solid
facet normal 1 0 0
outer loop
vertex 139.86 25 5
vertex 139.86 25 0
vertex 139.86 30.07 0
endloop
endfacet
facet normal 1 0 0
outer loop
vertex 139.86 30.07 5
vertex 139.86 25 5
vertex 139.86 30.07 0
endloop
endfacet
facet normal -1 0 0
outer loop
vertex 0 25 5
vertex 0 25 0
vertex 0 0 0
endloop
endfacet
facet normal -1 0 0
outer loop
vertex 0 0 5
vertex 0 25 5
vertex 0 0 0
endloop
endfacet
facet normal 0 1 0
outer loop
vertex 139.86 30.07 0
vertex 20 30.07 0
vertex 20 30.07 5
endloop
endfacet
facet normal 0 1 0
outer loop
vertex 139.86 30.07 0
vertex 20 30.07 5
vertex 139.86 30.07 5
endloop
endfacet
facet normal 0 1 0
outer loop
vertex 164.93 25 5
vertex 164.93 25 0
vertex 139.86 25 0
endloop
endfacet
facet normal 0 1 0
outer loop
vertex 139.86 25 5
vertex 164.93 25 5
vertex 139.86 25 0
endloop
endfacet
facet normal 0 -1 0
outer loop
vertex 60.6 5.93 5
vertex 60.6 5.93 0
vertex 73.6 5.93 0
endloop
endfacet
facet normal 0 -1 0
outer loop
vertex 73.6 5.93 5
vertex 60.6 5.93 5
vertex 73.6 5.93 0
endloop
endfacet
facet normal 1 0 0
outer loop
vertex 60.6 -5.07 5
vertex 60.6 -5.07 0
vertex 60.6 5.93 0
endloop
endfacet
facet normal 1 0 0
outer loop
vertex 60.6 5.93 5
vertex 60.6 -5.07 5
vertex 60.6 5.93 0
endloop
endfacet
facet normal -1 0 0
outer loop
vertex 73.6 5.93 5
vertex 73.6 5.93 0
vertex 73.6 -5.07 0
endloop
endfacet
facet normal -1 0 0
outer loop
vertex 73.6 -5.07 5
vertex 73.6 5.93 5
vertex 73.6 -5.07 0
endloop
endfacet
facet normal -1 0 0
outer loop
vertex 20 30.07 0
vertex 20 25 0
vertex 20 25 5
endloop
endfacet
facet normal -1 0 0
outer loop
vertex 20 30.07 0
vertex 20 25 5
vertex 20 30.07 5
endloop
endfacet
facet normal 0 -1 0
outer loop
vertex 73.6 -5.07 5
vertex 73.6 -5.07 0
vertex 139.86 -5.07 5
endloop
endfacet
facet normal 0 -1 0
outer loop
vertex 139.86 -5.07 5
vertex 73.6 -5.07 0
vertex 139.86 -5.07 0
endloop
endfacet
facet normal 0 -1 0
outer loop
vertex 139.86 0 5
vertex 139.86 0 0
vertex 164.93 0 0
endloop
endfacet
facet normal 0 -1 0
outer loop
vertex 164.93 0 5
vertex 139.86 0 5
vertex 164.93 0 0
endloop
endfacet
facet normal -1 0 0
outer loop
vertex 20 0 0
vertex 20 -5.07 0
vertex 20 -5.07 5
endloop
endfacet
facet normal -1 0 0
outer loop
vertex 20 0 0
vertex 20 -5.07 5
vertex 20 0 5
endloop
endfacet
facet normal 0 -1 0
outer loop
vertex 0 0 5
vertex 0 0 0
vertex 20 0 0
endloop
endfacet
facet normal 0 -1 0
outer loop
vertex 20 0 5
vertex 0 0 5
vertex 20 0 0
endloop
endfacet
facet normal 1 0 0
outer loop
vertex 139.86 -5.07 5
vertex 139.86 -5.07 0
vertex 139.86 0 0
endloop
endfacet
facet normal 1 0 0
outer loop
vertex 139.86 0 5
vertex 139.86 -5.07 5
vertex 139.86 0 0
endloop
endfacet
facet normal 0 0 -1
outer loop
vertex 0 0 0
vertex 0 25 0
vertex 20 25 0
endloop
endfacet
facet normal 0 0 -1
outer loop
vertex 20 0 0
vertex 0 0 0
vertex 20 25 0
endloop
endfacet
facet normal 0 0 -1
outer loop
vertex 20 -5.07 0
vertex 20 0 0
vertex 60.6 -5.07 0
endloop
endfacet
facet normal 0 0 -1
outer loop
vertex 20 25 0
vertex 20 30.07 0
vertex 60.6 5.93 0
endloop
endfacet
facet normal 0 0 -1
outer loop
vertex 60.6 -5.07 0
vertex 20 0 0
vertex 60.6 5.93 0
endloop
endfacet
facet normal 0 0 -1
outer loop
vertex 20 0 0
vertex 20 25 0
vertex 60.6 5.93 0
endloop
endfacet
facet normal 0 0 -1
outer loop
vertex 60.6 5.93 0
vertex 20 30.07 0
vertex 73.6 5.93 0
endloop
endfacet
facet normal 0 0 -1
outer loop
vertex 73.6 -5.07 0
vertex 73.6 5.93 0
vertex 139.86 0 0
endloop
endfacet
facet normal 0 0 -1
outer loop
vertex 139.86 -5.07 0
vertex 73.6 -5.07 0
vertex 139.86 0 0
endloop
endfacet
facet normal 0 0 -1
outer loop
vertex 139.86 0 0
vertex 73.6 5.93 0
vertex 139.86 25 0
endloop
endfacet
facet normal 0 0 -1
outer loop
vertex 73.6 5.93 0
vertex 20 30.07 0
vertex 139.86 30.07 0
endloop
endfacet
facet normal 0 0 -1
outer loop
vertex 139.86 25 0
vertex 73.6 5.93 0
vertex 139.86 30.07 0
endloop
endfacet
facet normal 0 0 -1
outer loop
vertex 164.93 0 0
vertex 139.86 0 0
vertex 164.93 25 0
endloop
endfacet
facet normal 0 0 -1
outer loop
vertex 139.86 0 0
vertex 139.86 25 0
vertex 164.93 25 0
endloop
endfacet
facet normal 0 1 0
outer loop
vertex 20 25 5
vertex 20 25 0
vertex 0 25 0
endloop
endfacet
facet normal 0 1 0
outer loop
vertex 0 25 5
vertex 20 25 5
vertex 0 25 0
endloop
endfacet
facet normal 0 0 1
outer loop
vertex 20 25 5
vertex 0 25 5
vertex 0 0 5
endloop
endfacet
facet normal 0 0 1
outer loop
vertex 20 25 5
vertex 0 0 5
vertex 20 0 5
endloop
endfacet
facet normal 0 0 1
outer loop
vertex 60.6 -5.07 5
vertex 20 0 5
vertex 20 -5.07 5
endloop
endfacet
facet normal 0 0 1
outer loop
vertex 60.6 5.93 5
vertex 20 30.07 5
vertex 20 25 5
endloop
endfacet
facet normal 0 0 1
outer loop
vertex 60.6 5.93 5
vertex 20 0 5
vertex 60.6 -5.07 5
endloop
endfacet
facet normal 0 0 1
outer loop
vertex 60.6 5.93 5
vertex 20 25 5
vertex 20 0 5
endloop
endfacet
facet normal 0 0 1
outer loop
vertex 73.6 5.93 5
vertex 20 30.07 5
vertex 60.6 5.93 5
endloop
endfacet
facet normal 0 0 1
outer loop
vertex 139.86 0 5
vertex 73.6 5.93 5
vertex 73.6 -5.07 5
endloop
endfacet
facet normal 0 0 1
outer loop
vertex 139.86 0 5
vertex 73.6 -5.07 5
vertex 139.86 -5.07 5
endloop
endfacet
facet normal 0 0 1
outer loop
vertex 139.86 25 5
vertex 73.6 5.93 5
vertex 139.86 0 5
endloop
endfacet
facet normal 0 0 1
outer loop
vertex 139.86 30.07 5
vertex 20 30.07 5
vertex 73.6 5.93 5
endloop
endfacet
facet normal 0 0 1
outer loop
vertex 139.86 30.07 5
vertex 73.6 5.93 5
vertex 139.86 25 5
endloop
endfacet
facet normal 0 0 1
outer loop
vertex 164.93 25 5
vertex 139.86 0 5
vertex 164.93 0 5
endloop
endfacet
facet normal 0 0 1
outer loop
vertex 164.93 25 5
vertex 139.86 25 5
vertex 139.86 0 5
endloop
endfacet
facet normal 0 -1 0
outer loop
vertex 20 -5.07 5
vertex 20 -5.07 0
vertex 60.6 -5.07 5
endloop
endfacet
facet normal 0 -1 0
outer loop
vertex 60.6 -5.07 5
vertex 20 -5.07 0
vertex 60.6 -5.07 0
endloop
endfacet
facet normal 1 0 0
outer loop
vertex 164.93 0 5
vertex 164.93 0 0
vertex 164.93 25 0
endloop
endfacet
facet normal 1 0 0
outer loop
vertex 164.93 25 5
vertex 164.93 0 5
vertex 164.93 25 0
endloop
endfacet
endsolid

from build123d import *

# Parameters (mm, degrees)
SKETCH_1_W      = 119.86
SKETCH_1_H      = 5.07
SKETCH_1_W_2    = 40.6
SKETCH_1_W_3    = 66.26
EXTRUDE_1_DEPTH = 5


with BuildPart() as part:
    # ｽｹｯﾁ1 → ﾎﾞｽ - 押し出し1 (new body)
    with BuildSketch(Plane.XY):
        Polygon((0, 25), (0, 0), (20, 0), (60.6, 0), (60.6, 5.93), (73.6, 5.93), (73.6, 0), (139.86, 0), (164.93, 0), (164.93, 25), (139.86, 25), (20, 25), align=None)
        with Locations((79.93, 27.535)):
            Rectangle(SKETCH_1_W, SKETCH_1_H)
        with Locations((40.3, -2.535)):
            Rectangle(SKETCH_1_W_2, SKETCH_1_H)
        with Locations((106.73, -2.535)):
            Rectangle(SKETCH_1_W_3, SKETCH_1_H)
    extrude(amount=EXTRUDE_1_DEPTH)


solid = part.part
